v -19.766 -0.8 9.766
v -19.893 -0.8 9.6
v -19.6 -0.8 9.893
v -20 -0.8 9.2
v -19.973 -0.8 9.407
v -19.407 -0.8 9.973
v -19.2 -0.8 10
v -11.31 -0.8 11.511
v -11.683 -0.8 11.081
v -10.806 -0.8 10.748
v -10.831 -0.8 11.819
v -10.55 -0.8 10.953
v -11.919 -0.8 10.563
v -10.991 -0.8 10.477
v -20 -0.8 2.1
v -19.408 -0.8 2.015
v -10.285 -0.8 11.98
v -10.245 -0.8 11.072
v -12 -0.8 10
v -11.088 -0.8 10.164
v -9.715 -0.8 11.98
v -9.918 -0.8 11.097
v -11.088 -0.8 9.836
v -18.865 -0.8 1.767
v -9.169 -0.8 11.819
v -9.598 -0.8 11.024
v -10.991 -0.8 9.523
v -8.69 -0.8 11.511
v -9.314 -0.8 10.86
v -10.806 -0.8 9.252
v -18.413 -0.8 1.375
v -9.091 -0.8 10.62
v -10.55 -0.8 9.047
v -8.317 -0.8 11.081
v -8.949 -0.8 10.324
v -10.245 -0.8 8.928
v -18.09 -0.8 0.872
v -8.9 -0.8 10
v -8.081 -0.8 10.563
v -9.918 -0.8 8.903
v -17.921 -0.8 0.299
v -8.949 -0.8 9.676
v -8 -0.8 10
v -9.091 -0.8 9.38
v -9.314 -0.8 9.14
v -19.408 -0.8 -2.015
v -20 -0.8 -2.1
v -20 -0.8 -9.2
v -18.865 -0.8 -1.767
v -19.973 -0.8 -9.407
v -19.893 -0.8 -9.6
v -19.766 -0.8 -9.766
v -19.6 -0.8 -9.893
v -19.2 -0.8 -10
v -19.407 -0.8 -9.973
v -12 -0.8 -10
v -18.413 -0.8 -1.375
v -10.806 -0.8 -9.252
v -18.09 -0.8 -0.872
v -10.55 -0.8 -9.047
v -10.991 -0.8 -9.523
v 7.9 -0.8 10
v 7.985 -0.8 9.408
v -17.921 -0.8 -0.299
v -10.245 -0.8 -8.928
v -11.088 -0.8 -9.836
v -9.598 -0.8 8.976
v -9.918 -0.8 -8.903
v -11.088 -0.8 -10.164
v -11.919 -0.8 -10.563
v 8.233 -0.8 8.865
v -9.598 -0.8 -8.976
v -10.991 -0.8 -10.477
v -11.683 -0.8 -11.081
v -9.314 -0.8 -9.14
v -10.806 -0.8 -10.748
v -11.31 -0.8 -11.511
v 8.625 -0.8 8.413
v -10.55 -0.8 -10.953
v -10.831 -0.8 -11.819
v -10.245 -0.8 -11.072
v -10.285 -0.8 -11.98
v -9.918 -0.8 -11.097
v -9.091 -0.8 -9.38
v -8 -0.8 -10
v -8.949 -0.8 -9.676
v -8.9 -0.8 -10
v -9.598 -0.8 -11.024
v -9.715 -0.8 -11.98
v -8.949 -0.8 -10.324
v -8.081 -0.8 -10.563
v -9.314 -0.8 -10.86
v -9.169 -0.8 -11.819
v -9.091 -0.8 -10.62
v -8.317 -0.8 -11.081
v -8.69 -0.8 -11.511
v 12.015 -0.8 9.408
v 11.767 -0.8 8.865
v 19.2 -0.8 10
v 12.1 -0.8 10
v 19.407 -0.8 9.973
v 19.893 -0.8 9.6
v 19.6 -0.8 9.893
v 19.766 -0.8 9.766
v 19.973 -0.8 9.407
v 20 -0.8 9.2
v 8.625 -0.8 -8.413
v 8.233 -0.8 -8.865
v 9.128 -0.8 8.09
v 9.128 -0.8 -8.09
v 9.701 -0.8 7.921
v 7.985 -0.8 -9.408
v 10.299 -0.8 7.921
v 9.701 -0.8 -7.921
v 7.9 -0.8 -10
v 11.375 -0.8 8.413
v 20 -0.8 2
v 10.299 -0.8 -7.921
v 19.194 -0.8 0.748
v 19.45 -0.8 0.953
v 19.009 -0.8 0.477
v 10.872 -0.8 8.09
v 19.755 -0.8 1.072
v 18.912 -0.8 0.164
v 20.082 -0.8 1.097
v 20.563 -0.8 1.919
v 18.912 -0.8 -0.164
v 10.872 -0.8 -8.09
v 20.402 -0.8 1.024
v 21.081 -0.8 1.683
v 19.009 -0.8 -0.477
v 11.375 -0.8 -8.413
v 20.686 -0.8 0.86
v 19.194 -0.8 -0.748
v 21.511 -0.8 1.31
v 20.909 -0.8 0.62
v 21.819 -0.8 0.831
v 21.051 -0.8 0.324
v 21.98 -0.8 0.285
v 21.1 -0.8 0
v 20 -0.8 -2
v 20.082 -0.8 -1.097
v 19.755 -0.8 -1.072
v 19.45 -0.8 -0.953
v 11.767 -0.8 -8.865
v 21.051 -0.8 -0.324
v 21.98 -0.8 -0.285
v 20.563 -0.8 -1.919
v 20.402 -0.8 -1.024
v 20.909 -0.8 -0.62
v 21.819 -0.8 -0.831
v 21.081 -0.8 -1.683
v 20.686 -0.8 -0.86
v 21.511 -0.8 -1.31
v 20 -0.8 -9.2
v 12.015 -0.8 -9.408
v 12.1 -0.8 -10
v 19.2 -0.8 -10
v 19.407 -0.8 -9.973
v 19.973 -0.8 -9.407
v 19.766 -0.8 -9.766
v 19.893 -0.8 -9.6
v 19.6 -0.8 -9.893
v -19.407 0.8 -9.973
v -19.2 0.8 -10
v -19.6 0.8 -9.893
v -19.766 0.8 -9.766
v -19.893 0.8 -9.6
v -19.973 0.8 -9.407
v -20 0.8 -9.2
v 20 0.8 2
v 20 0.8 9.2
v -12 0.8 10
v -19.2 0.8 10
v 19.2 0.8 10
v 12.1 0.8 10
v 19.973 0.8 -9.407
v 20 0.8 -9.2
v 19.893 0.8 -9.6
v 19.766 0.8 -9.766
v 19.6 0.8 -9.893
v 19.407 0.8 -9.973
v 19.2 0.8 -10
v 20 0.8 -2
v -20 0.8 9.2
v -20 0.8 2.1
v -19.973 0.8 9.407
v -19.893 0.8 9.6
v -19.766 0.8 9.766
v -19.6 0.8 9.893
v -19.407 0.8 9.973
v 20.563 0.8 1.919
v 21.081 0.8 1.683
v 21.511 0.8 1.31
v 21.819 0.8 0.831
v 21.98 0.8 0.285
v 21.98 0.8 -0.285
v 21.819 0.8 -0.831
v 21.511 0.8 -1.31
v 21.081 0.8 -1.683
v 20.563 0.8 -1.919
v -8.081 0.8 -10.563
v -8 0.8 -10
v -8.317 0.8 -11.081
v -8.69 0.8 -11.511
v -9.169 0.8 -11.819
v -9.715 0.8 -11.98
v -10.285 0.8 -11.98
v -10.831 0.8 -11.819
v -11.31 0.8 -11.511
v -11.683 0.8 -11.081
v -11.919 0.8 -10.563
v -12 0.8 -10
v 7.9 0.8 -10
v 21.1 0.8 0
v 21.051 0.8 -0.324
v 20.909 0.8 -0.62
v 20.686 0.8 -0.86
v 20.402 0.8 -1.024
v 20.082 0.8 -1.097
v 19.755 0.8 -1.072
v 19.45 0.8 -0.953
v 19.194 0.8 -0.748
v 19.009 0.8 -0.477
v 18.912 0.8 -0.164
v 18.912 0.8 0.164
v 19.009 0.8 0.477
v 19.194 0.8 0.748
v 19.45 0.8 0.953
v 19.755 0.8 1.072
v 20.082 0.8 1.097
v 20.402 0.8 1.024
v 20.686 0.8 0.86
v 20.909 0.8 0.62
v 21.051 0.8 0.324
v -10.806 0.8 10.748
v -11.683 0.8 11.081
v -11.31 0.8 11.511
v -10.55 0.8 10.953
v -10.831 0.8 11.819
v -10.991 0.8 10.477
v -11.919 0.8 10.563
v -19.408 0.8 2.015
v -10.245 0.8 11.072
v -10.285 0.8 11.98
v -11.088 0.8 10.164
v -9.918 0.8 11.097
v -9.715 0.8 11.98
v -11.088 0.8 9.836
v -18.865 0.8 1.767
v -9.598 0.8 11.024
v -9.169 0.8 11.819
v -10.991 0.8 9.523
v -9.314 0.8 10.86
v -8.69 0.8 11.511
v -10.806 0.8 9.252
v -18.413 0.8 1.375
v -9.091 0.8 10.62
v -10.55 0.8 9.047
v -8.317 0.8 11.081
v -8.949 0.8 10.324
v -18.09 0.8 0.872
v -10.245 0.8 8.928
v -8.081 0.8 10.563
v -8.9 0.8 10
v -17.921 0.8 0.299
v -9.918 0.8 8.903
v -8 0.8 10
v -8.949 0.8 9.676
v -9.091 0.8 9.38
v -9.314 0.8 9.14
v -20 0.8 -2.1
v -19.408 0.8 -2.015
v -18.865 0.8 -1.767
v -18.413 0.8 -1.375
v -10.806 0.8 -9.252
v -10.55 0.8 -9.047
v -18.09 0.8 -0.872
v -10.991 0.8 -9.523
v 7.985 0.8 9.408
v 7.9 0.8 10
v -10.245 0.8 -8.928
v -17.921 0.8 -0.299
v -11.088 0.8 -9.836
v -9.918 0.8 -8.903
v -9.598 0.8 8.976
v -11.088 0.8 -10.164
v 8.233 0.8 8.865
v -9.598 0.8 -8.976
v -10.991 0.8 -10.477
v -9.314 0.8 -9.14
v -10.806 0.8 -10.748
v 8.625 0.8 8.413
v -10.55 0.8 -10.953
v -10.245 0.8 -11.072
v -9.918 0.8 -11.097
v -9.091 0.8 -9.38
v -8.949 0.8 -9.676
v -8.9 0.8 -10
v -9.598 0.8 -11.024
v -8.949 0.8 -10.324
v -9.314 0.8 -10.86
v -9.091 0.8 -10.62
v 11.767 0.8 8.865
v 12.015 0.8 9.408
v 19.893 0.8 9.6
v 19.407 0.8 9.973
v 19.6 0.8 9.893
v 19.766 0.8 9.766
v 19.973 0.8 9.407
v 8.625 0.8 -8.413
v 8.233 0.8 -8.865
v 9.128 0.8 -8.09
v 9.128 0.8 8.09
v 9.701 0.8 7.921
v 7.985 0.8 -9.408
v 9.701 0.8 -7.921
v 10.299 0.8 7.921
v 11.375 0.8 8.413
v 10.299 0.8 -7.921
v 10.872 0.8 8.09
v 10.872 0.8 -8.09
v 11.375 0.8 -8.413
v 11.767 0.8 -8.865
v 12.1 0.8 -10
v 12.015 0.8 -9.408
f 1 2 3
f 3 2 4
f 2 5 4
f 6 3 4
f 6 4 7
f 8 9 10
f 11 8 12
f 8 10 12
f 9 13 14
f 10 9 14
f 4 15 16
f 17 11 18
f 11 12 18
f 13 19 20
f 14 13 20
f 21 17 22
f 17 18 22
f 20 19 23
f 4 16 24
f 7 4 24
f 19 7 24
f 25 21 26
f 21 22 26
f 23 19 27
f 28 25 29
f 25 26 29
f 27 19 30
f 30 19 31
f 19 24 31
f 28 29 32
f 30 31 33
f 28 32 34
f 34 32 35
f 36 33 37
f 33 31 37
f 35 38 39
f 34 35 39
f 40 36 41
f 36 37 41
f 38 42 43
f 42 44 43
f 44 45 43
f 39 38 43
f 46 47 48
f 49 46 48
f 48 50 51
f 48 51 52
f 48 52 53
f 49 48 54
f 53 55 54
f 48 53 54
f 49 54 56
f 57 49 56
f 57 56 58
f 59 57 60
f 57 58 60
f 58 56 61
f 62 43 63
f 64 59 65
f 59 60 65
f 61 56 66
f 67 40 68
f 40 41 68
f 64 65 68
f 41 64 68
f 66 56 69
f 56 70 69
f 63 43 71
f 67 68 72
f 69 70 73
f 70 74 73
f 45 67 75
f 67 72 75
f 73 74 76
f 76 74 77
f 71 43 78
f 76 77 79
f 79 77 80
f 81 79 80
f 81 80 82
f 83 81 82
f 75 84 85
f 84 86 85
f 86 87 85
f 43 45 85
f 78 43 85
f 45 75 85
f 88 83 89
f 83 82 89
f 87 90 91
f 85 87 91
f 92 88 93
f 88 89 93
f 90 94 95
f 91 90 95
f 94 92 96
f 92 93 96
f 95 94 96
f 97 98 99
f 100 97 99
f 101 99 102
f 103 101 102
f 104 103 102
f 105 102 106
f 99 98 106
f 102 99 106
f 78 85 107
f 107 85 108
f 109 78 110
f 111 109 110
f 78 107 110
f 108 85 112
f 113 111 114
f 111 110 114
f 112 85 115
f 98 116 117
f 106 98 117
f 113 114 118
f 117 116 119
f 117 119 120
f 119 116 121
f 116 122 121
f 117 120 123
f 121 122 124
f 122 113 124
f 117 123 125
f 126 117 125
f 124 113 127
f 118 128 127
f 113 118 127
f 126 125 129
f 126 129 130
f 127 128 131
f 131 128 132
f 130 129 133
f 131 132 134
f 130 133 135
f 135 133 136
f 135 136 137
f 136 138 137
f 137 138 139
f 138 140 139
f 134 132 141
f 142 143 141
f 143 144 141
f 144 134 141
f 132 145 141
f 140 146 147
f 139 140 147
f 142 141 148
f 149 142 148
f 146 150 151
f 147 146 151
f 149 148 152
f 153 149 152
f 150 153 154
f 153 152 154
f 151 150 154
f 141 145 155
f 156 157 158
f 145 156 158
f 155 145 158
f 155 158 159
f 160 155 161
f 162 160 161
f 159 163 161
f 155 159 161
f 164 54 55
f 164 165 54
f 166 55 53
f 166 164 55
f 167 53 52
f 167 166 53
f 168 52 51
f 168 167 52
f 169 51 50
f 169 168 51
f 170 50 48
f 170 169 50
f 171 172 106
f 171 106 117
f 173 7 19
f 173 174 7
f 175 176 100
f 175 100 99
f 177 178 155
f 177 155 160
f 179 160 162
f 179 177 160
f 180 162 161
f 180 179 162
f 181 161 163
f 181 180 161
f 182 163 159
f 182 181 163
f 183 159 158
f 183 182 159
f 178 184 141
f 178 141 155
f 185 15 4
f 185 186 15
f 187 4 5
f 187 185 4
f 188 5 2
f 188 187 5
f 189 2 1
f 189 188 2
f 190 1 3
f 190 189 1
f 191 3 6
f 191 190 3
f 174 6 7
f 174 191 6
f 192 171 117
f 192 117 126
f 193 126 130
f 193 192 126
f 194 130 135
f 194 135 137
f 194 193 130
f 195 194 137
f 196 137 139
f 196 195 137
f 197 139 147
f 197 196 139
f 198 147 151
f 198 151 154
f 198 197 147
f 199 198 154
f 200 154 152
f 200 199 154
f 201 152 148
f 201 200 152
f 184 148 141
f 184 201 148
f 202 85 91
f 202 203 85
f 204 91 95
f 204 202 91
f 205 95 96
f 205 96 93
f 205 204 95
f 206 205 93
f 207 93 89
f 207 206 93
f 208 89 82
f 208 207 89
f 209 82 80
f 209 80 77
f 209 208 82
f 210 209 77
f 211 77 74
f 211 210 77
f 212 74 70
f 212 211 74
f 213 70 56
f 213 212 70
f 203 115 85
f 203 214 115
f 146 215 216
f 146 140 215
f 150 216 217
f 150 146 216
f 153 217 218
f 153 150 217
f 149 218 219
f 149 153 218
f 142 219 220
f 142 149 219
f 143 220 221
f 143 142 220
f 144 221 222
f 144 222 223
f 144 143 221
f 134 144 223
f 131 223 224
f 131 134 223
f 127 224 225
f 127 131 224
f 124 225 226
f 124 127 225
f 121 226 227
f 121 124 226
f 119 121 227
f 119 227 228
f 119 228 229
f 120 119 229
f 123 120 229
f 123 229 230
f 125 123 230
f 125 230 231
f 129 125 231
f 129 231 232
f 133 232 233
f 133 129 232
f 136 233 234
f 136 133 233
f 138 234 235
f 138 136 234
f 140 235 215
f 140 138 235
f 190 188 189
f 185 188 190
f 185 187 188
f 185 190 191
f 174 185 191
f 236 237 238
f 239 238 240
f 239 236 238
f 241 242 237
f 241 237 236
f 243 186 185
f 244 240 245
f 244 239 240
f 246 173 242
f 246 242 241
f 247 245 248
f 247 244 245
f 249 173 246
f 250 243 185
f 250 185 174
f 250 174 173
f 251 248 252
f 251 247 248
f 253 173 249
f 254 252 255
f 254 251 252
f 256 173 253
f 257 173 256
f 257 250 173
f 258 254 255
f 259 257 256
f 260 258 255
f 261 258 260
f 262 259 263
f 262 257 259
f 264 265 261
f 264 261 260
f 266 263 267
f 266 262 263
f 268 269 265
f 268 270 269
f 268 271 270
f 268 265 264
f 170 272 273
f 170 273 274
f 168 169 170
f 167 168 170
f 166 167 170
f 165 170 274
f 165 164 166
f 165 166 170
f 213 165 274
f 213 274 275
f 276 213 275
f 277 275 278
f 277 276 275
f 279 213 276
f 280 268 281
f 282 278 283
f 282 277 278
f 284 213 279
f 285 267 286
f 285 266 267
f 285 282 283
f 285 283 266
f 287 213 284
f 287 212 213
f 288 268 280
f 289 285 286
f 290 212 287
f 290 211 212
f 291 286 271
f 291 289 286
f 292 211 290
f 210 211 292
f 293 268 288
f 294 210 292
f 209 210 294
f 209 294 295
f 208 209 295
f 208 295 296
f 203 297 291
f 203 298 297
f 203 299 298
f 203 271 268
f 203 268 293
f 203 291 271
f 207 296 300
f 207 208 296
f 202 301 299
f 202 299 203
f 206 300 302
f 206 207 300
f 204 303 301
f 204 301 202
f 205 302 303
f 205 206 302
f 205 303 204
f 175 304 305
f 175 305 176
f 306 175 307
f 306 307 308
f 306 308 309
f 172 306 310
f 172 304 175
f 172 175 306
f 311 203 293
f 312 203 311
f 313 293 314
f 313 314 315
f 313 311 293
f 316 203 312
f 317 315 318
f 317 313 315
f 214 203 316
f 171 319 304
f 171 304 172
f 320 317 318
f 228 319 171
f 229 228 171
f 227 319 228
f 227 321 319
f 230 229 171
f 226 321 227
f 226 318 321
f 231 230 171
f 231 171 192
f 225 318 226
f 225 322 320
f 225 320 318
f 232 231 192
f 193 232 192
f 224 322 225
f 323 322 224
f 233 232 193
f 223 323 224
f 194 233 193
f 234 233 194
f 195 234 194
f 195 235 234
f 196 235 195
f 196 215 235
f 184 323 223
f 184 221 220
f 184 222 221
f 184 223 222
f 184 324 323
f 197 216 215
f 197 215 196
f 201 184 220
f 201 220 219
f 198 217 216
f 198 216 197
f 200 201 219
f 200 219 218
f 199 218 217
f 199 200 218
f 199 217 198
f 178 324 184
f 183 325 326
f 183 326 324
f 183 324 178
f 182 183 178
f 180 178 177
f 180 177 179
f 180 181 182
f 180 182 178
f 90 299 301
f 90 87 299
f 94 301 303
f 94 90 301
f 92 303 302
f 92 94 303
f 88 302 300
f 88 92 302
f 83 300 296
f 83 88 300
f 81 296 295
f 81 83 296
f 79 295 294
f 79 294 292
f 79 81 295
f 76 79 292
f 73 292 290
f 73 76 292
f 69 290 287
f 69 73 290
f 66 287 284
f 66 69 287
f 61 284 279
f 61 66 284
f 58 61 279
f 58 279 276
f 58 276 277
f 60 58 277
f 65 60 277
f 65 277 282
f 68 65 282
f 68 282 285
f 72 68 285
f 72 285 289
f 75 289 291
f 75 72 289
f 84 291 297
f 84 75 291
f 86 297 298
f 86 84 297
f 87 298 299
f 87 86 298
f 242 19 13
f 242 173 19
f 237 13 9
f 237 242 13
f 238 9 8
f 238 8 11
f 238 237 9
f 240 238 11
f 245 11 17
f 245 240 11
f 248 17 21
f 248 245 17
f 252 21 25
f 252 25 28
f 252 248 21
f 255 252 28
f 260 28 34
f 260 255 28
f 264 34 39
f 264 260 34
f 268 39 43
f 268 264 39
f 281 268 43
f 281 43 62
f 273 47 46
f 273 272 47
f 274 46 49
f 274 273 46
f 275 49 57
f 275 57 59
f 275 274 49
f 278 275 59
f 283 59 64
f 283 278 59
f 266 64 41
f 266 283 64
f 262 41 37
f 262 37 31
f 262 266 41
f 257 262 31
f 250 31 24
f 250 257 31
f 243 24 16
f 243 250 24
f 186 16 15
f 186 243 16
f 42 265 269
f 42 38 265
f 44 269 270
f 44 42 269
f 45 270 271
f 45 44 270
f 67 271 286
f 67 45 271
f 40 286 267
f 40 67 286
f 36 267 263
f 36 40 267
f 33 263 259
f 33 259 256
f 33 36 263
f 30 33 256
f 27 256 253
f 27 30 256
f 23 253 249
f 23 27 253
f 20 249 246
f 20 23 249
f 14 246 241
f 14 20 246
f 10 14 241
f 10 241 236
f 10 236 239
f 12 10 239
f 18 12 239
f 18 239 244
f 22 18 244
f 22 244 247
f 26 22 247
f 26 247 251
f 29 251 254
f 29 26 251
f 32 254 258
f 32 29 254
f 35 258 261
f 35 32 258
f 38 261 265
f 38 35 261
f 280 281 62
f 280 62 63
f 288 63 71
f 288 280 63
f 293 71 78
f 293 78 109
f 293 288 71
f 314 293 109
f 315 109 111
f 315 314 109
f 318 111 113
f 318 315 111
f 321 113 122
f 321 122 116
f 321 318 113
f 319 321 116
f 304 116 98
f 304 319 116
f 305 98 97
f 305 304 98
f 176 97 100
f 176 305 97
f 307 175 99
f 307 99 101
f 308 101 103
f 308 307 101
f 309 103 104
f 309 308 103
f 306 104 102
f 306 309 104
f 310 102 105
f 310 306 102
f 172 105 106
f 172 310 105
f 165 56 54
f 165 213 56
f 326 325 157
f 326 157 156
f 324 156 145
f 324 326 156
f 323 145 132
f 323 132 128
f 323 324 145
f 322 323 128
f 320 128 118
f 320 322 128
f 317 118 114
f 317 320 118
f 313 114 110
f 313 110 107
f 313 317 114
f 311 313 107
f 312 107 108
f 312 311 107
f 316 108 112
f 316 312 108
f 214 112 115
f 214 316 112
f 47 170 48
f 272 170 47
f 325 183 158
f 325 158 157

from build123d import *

# Parameters (mm, degrees)
ESQUISSE1_R        = 1.1
BOSS_EXTRU_1_DEPTH = 0.8


with BuildPart() as part:
    # Esquisse1 → Boss.-Extru.1 (new body, symmetric)
    with BuildSketch(Plane(origin=(0, 0, 0), x_dir=(1, 0, 0), z_dir=(0, 1, 0))):
        with BuildLine():
            ThreePointArc((-12, -10), (-10, -12), (-8, -10))
            Line((-8, -10), (7.9, -10))
            ThreePointArc((7.9, -10), (10, -7.9), (12.1, -10))
            Line((12.1, -10), (19.2, -10))
            ThreePointArc((19.2, -10), (19.765685425, -9.765685425), (20, -9.2))
            Line((20, -9.2), (20, -2))
            ThreePointArc((20, -2), (22, 0), (20, 2))
            Line((20, 2), (20, 9.2))
            ThreePointArc((20, 9.2), (19.765685425, 9.765685425), (19.2, 10))
            Line((19.2, 10), (12.1, 10))
            ThreePointArc((12.1, 10), (10, 7.9), (7.9, 10))
            Line((7.9, 10), (-8, 10))
            ThreePointArc((-8, 10), (-10, 12), (-12, 10))
            Line((-12, 10), (-19.2, 10))
            ThreePointArc((-19.2, 10), (-19.765685425, 9.765685425), (-20, 9.2))
            Line((-20, 9.2), (-20, 2.1))
            ThreePointArc((-20, 2.1), (-17.9, 0), (-20, -2.1))
            Line((-20, -2.1), (-20, -9.2))
            ThreePointArc((-20, -9.2), (-19.765685425, -9.765685425), (-19.2, -10))
            Line((-19.2, -10), (-12, -10))
        make_face()
        with Locations((-10, -10)):
            Circle(ESQUISSE1_R, mode=Mode.SUBTRACT)
        with Locations((20, 0)):
            Circle(ESQUISSE1_R, mode=Mode.SUBTRACT)
        with Locations((-10, 10)):
            Circle(ESQUISSE1_R, mode=Mode.SUBTRACT)
    extrude(amount=BOSS_EXTRU_1_DEPTH, both=True)


solid = part.part
